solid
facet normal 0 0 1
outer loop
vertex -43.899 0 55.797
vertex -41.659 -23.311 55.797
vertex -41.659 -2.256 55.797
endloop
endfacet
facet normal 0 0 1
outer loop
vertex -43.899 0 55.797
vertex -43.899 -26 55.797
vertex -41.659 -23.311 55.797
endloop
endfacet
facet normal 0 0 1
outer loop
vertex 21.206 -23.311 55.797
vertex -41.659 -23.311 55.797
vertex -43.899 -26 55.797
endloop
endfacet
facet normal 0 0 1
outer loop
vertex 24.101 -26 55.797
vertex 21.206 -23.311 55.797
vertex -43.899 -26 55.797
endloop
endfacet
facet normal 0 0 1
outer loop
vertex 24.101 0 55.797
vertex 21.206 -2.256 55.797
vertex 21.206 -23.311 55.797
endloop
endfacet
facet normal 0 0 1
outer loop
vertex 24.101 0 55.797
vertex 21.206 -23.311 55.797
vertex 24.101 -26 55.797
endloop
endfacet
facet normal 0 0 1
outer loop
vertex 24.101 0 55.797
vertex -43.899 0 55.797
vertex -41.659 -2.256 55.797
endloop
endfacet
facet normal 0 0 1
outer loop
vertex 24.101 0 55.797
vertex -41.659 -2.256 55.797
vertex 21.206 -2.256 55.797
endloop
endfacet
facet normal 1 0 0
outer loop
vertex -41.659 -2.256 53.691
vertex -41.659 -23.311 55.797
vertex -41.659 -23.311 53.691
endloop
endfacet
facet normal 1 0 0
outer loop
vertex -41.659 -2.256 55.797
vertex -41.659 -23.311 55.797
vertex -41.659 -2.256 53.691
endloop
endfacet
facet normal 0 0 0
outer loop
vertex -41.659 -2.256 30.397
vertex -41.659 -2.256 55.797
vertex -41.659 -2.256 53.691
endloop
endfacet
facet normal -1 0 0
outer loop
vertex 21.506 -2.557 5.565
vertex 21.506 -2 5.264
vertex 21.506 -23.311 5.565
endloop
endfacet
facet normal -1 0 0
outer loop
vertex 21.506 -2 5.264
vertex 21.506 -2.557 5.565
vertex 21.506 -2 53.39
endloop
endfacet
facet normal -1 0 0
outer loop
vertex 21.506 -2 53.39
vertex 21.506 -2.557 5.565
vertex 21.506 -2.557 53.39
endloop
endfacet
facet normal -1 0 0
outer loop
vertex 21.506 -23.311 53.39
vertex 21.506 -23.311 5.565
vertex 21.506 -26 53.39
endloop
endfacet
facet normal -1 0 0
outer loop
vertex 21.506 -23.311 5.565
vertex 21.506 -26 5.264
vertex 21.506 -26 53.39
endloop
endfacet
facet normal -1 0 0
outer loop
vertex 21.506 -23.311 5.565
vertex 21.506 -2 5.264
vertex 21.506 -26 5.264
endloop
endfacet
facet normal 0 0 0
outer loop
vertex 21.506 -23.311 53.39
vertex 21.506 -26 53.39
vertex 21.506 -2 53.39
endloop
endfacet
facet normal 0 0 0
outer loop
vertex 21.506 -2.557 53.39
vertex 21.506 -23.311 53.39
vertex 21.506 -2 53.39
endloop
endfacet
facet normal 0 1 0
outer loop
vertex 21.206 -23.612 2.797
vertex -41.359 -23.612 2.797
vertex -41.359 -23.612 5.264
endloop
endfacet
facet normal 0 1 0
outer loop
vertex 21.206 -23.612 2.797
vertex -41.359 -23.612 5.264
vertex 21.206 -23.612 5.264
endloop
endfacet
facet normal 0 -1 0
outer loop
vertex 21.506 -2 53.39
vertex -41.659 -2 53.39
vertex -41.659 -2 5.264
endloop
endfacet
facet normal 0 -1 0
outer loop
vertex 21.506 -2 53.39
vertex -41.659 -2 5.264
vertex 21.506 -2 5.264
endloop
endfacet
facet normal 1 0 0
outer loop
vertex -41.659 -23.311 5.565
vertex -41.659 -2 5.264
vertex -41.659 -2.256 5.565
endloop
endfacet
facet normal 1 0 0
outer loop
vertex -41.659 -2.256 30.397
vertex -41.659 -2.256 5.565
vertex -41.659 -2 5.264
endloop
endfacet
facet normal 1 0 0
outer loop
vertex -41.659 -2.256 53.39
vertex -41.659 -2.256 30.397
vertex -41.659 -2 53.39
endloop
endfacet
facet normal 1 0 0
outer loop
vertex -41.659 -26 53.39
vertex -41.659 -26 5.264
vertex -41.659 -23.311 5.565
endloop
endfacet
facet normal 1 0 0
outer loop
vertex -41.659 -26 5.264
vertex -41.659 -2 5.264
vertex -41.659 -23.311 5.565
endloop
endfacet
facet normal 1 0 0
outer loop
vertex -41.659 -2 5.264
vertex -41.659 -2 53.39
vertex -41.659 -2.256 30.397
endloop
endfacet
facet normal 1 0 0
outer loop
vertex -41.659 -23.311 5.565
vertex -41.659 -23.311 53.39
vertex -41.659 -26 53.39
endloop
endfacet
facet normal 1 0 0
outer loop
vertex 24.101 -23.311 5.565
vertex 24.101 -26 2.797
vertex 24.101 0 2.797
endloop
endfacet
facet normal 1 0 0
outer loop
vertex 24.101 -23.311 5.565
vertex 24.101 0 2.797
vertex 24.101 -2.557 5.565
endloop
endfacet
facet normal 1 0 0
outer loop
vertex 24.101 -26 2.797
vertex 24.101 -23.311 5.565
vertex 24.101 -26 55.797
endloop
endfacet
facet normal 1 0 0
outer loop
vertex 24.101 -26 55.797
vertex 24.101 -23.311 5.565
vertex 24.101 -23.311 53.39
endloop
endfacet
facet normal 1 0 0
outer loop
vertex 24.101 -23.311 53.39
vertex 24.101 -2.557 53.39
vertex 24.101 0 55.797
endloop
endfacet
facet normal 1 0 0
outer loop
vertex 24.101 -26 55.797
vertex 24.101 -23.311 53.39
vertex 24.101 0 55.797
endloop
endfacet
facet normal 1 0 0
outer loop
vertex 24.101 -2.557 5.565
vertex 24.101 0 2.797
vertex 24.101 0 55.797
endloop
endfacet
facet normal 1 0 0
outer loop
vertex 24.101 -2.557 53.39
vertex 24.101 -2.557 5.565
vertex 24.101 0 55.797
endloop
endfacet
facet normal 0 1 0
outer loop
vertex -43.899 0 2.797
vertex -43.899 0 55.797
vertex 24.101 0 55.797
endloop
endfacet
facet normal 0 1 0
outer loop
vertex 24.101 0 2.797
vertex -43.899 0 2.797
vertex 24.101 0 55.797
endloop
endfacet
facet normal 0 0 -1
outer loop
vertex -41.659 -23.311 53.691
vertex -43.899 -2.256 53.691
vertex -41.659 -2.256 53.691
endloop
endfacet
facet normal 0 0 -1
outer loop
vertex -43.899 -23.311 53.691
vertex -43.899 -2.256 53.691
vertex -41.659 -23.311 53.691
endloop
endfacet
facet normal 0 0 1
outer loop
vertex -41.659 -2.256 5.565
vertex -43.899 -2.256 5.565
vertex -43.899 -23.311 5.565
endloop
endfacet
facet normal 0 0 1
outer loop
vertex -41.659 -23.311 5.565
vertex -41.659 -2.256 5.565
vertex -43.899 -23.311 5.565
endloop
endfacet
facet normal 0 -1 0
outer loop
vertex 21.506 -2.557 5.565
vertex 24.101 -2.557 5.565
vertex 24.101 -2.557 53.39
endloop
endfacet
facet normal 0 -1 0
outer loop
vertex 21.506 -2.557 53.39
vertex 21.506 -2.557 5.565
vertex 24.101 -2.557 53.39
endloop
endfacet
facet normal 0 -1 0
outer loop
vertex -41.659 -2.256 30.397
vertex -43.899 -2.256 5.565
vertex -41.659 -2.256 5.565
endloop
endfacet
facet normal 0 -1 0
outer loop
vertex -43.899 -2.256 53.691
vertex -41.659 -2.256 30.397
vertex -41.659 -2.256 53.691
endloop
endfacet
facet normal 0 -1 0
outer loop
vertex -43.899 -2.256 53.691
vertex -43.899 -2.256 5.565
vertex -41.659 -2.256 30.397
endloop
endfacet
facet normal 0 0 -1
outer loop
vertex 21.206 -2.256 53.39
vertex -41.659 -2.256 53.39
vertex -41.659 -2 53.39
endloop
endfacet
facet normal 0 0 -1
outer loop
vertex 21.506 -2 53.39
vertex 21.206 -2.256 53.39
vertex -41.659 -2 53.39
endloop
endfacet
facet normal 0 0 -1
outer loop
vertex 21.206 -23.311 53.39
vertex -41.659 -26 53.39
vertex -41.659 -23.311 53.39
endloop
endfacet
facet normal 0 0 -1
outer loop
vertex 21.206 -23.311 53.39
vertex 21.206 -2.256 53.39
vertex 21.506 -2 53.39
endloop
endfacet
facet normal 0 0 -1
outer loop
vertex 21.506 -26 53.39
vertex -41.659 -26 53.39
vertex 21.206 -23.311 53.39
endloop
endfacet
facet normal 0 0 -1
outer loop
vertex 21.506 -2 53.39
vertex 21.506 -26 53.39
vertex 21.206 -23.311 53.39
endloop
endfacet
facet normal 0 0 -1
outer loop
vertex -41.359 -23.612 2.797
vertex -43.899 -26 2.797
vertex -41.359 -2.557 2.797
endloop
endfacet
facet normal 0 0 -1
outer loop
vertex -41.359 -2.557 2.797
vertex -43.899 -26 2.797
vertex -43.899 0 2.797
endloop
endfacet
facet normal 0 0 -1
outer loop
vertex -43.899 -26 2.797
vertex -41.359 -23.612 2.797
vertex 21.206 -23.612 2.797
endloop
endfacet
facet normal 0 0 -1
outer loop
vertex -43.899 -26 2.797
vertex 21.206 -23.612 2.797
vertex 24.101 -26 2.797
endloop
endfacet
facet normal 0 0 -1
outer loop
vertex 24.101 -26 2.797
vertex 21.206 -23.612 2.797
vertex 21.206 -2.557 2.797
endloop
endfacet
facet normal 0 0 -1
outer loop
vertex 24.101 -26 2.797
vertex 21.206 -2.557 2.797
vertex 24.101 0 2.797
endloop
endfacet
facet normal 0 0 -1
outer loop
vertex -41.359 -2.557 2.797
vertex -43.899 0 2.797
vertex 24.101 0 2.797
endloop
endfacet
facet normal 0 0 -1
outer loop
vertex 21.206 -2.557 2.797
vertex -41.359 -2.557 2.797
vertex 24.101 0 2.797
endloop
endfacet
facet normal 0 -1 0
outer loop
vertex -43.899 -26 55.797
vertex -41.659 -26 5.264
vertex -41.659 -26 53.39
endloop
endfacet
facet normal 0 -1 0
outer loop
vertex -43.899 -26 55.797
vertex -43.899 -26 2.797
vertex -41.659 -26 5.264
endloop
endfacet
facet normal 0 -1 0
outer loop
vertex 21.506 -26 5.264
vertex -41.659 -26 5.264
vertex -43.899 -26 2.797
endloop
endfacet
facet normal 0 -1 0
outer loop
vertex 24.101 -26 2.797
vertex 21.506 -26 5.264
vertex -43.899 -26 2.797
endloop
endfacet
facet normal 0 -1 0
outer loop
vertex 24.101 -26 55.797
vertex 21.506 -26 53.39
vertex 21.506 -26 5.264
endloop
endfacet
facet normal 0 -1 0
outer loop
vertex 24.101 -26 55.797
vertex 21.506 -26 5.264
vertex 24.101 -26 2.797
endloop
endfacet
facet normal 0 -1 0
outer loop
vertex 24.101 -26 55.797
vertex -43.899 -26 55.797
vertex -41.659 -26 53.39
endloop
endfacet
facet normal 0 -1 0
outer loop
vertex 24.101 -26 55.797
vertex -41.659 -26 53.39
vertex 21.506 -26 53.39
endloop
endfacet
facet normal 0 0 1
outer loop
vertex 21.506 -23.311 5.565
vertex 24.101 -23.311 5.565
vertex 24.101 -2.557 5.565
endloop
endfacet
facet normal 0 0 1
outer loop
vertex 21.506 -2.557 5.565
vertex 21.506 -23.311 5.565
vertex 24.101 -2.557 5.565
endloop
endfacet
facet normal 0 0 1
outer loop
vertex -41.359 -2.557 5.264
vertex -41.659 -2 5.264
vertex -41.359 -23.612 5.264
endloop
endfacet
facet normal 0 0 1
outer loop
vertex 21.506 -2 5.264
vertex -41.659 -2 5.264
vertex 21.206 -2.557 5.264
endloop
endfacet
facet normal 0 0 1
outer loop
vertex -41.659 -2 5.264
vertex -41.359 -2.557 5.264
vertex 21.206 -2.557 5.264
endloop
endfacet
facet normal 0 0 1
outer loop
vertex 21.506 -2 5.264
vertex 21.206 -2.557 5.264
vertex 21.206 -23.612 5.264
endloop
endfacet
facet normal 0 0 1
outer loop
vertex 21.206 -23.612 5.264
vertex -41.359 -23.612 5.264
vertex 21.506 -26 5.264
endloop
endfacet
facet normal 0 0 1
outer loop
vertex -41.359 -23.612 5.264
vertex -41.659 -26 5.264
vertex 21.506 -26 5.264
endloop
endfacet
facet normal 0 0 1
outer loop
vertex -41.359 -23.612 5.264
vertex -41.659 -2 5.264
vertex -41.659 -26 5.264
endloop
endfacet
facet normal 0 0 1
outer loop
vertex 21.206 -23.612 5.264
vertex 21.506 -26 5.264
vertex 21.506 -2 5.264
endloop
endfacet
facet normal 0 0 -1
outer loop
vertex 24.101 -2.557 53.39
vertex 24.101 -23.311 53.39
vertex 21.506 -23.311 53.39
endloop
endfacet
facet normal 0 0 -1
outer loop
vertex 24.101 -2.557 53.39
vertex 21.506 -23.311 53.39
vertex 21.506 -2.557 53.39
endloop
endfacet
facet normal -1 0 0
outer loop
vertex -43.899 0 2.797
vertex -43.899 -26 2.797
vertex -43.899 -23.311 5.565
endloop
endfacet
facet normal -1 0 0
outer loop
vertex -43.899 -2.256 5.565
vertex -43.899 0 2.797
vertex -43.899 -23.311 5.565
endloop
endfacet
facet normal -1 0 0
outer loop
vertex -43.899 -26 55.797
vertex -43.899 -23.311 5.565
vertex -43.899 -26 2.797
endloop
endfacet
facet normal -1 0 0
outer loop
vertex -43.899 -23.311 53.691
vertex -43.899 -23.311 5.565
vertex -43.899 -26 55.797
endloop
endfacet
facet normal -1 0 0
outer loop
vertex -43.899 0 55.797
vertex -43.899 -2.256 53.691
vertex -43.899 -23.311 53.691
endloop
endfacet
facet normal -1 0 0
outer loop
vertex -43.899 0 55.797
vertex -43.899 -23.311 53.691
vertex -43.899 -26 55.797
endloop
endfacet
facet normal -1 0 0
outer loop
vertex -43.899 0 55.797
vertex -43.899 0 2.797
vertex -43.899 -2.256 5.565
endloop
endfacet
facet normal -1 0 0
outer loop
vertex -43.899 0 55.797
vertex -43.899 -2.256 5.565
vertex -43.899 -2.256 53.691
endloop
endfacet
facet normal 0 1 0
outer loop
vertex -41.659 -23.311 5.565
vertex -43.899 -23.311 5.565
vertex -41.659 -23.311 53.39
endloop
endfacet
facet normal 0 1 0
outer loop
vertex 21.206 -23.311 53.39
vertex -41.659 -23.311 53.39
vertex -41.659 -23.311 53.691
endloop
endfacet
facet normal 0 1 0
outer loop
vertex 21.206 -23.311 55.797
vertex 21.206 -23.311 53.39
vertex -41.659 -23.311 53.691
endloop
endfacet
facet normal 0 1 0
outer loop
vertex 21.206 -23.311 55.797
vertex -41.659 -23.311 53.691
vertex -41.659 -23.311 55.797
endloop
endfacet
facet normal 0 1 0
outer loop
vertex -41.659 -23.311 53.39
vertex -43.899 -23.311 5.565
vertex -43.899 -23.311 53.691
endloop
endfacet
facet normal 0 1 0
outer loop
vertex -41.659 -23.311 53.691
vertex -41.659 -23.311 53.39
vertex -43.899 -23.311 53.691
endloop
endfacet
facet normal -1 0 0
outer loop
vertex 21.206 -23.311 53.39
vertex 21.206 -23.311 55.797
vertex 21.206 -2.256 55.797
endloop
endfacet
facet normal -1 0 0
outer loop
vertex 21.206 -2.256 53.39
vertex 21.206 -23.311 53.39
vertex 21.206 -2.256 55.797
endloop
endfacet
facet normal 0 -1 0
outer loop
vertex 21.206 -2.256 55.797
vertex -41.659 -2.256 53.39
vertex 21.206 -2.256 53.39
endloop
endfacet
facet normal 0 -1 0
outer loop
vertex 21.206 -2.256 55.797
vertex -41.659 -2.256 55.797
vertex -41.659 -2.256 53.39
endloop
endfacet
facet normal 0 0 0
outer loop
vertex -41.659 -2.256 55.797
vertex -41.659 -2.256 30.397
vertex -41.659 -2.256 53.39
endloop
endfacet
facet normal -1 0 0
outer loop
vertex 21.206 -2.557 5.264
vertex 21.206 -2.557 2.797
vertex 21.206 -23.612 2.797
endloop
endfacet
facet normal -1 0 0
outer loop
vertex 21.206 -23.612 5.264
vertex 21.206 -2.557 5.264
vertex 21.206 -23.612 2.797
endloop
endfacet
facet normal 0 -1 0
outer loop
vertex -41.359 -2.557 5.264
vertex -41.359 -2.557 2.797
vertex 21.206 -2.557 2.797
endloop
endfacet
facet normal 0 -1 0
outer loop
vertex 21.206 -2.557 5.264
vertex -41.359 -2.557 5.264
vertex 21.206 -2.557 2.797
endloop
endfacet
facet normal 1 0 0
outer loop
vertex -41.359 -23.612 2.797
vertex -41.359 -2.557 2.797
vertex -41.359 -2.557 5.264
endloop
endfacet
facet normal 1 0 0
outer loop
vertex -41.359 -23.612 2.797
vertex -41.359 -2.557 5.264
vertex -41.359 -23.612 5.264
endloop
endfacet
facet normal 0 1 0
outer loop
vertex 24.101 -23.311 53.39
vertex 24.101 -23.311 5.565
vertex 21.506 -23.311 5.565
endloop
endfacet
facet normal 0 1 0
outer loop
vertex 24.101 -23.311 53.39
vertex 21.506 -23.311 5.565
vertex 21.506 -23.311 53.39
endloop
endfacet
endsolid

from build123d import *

# Parameters (mm, degrees)
F0_W      = 68
F0_H      = 53
F1_DEPTH  = 26
F2_W      = 63.165789
F2_H      = 48.126318
F3_DEPTH  = 24
F4_W      = 20.754472
F4_H      = 47.825529
F5_DEPTH  = 25.4
F6_W      = 62.564209
F6_H      = 21.055263
F7_DEPTH  = 25.4
F8_W      = 62.865002
F8_H      = 21.055264
F9_DEPTH  = 25.4
F10_W     = 21.055262
F10_H     = 48.126317
F11_DEPTH = 25.4


with BuildPart() as f1:
    # F0 (on Front) → F1 (new body)
    with BuildSketch(Plane.XZ):
        with Locations((-9.898553, 29.29739)):
            Rectangle(F0_W, F0_H)
    extrude(amount=F1_DEPTH)

    # F2 (on face) → F3 (cut)
    with BuildSketch(Plane.XZ.offset(26)):
        with Locations((-10.076449, 29.326975)):
            Rectangle(F2_W, F2_H)
    extrude(amount=-F3_DEPTH, mode=Mode.SUBTRACT)

    # F4 (on face) → F5 (cut)
    with BuildSketch(Plane.YZ.offset(24.101447)):
        with Locations((-12.933949, 29.477369)):
            Rectangle(F4_W, F4_H)
    extrude(amount=-F5_DEPTH, mode=Mode.SUBTRACT)

    # F6 (on face) → F7 (cut)
    with BuildSketch(Plane(origin=(0, 0, 2.79739), x_dir=(1, 0, 0), z_dir=(0, 0, -1))):
        with Locations((-10.076449, 13.084342)):
            Rectangle(F6_W, F6_H)
    extrude(amount=-F7_DEPTH, mode=Mode.SUBTRACT)

    # F8 (on face) → F9 (cut)
    with BuildSketch(Plane.XY.offset(55.79739)):
        with Locations((-10.226843, -12.783553)):
            Rectangle(F8_W, F8_H)
    extrude(amount=-F9_DEPTH, mode=Mode.SUBTRACT)

    # F10 (on face) → F11 (cut)
    with BuildSketch(Plane(origin=(-43.898553, 0, 0), x_dir=(0, -1, 0), z_dir=(-1, 0, 0))):
        with Locations((12.783554, 29.627764)):
            Rectangle(F10_W, F10_H)
    extrude(amount=-F11_DEPTH, mode=Mode.SUBTRACT)


solid = f1.part
